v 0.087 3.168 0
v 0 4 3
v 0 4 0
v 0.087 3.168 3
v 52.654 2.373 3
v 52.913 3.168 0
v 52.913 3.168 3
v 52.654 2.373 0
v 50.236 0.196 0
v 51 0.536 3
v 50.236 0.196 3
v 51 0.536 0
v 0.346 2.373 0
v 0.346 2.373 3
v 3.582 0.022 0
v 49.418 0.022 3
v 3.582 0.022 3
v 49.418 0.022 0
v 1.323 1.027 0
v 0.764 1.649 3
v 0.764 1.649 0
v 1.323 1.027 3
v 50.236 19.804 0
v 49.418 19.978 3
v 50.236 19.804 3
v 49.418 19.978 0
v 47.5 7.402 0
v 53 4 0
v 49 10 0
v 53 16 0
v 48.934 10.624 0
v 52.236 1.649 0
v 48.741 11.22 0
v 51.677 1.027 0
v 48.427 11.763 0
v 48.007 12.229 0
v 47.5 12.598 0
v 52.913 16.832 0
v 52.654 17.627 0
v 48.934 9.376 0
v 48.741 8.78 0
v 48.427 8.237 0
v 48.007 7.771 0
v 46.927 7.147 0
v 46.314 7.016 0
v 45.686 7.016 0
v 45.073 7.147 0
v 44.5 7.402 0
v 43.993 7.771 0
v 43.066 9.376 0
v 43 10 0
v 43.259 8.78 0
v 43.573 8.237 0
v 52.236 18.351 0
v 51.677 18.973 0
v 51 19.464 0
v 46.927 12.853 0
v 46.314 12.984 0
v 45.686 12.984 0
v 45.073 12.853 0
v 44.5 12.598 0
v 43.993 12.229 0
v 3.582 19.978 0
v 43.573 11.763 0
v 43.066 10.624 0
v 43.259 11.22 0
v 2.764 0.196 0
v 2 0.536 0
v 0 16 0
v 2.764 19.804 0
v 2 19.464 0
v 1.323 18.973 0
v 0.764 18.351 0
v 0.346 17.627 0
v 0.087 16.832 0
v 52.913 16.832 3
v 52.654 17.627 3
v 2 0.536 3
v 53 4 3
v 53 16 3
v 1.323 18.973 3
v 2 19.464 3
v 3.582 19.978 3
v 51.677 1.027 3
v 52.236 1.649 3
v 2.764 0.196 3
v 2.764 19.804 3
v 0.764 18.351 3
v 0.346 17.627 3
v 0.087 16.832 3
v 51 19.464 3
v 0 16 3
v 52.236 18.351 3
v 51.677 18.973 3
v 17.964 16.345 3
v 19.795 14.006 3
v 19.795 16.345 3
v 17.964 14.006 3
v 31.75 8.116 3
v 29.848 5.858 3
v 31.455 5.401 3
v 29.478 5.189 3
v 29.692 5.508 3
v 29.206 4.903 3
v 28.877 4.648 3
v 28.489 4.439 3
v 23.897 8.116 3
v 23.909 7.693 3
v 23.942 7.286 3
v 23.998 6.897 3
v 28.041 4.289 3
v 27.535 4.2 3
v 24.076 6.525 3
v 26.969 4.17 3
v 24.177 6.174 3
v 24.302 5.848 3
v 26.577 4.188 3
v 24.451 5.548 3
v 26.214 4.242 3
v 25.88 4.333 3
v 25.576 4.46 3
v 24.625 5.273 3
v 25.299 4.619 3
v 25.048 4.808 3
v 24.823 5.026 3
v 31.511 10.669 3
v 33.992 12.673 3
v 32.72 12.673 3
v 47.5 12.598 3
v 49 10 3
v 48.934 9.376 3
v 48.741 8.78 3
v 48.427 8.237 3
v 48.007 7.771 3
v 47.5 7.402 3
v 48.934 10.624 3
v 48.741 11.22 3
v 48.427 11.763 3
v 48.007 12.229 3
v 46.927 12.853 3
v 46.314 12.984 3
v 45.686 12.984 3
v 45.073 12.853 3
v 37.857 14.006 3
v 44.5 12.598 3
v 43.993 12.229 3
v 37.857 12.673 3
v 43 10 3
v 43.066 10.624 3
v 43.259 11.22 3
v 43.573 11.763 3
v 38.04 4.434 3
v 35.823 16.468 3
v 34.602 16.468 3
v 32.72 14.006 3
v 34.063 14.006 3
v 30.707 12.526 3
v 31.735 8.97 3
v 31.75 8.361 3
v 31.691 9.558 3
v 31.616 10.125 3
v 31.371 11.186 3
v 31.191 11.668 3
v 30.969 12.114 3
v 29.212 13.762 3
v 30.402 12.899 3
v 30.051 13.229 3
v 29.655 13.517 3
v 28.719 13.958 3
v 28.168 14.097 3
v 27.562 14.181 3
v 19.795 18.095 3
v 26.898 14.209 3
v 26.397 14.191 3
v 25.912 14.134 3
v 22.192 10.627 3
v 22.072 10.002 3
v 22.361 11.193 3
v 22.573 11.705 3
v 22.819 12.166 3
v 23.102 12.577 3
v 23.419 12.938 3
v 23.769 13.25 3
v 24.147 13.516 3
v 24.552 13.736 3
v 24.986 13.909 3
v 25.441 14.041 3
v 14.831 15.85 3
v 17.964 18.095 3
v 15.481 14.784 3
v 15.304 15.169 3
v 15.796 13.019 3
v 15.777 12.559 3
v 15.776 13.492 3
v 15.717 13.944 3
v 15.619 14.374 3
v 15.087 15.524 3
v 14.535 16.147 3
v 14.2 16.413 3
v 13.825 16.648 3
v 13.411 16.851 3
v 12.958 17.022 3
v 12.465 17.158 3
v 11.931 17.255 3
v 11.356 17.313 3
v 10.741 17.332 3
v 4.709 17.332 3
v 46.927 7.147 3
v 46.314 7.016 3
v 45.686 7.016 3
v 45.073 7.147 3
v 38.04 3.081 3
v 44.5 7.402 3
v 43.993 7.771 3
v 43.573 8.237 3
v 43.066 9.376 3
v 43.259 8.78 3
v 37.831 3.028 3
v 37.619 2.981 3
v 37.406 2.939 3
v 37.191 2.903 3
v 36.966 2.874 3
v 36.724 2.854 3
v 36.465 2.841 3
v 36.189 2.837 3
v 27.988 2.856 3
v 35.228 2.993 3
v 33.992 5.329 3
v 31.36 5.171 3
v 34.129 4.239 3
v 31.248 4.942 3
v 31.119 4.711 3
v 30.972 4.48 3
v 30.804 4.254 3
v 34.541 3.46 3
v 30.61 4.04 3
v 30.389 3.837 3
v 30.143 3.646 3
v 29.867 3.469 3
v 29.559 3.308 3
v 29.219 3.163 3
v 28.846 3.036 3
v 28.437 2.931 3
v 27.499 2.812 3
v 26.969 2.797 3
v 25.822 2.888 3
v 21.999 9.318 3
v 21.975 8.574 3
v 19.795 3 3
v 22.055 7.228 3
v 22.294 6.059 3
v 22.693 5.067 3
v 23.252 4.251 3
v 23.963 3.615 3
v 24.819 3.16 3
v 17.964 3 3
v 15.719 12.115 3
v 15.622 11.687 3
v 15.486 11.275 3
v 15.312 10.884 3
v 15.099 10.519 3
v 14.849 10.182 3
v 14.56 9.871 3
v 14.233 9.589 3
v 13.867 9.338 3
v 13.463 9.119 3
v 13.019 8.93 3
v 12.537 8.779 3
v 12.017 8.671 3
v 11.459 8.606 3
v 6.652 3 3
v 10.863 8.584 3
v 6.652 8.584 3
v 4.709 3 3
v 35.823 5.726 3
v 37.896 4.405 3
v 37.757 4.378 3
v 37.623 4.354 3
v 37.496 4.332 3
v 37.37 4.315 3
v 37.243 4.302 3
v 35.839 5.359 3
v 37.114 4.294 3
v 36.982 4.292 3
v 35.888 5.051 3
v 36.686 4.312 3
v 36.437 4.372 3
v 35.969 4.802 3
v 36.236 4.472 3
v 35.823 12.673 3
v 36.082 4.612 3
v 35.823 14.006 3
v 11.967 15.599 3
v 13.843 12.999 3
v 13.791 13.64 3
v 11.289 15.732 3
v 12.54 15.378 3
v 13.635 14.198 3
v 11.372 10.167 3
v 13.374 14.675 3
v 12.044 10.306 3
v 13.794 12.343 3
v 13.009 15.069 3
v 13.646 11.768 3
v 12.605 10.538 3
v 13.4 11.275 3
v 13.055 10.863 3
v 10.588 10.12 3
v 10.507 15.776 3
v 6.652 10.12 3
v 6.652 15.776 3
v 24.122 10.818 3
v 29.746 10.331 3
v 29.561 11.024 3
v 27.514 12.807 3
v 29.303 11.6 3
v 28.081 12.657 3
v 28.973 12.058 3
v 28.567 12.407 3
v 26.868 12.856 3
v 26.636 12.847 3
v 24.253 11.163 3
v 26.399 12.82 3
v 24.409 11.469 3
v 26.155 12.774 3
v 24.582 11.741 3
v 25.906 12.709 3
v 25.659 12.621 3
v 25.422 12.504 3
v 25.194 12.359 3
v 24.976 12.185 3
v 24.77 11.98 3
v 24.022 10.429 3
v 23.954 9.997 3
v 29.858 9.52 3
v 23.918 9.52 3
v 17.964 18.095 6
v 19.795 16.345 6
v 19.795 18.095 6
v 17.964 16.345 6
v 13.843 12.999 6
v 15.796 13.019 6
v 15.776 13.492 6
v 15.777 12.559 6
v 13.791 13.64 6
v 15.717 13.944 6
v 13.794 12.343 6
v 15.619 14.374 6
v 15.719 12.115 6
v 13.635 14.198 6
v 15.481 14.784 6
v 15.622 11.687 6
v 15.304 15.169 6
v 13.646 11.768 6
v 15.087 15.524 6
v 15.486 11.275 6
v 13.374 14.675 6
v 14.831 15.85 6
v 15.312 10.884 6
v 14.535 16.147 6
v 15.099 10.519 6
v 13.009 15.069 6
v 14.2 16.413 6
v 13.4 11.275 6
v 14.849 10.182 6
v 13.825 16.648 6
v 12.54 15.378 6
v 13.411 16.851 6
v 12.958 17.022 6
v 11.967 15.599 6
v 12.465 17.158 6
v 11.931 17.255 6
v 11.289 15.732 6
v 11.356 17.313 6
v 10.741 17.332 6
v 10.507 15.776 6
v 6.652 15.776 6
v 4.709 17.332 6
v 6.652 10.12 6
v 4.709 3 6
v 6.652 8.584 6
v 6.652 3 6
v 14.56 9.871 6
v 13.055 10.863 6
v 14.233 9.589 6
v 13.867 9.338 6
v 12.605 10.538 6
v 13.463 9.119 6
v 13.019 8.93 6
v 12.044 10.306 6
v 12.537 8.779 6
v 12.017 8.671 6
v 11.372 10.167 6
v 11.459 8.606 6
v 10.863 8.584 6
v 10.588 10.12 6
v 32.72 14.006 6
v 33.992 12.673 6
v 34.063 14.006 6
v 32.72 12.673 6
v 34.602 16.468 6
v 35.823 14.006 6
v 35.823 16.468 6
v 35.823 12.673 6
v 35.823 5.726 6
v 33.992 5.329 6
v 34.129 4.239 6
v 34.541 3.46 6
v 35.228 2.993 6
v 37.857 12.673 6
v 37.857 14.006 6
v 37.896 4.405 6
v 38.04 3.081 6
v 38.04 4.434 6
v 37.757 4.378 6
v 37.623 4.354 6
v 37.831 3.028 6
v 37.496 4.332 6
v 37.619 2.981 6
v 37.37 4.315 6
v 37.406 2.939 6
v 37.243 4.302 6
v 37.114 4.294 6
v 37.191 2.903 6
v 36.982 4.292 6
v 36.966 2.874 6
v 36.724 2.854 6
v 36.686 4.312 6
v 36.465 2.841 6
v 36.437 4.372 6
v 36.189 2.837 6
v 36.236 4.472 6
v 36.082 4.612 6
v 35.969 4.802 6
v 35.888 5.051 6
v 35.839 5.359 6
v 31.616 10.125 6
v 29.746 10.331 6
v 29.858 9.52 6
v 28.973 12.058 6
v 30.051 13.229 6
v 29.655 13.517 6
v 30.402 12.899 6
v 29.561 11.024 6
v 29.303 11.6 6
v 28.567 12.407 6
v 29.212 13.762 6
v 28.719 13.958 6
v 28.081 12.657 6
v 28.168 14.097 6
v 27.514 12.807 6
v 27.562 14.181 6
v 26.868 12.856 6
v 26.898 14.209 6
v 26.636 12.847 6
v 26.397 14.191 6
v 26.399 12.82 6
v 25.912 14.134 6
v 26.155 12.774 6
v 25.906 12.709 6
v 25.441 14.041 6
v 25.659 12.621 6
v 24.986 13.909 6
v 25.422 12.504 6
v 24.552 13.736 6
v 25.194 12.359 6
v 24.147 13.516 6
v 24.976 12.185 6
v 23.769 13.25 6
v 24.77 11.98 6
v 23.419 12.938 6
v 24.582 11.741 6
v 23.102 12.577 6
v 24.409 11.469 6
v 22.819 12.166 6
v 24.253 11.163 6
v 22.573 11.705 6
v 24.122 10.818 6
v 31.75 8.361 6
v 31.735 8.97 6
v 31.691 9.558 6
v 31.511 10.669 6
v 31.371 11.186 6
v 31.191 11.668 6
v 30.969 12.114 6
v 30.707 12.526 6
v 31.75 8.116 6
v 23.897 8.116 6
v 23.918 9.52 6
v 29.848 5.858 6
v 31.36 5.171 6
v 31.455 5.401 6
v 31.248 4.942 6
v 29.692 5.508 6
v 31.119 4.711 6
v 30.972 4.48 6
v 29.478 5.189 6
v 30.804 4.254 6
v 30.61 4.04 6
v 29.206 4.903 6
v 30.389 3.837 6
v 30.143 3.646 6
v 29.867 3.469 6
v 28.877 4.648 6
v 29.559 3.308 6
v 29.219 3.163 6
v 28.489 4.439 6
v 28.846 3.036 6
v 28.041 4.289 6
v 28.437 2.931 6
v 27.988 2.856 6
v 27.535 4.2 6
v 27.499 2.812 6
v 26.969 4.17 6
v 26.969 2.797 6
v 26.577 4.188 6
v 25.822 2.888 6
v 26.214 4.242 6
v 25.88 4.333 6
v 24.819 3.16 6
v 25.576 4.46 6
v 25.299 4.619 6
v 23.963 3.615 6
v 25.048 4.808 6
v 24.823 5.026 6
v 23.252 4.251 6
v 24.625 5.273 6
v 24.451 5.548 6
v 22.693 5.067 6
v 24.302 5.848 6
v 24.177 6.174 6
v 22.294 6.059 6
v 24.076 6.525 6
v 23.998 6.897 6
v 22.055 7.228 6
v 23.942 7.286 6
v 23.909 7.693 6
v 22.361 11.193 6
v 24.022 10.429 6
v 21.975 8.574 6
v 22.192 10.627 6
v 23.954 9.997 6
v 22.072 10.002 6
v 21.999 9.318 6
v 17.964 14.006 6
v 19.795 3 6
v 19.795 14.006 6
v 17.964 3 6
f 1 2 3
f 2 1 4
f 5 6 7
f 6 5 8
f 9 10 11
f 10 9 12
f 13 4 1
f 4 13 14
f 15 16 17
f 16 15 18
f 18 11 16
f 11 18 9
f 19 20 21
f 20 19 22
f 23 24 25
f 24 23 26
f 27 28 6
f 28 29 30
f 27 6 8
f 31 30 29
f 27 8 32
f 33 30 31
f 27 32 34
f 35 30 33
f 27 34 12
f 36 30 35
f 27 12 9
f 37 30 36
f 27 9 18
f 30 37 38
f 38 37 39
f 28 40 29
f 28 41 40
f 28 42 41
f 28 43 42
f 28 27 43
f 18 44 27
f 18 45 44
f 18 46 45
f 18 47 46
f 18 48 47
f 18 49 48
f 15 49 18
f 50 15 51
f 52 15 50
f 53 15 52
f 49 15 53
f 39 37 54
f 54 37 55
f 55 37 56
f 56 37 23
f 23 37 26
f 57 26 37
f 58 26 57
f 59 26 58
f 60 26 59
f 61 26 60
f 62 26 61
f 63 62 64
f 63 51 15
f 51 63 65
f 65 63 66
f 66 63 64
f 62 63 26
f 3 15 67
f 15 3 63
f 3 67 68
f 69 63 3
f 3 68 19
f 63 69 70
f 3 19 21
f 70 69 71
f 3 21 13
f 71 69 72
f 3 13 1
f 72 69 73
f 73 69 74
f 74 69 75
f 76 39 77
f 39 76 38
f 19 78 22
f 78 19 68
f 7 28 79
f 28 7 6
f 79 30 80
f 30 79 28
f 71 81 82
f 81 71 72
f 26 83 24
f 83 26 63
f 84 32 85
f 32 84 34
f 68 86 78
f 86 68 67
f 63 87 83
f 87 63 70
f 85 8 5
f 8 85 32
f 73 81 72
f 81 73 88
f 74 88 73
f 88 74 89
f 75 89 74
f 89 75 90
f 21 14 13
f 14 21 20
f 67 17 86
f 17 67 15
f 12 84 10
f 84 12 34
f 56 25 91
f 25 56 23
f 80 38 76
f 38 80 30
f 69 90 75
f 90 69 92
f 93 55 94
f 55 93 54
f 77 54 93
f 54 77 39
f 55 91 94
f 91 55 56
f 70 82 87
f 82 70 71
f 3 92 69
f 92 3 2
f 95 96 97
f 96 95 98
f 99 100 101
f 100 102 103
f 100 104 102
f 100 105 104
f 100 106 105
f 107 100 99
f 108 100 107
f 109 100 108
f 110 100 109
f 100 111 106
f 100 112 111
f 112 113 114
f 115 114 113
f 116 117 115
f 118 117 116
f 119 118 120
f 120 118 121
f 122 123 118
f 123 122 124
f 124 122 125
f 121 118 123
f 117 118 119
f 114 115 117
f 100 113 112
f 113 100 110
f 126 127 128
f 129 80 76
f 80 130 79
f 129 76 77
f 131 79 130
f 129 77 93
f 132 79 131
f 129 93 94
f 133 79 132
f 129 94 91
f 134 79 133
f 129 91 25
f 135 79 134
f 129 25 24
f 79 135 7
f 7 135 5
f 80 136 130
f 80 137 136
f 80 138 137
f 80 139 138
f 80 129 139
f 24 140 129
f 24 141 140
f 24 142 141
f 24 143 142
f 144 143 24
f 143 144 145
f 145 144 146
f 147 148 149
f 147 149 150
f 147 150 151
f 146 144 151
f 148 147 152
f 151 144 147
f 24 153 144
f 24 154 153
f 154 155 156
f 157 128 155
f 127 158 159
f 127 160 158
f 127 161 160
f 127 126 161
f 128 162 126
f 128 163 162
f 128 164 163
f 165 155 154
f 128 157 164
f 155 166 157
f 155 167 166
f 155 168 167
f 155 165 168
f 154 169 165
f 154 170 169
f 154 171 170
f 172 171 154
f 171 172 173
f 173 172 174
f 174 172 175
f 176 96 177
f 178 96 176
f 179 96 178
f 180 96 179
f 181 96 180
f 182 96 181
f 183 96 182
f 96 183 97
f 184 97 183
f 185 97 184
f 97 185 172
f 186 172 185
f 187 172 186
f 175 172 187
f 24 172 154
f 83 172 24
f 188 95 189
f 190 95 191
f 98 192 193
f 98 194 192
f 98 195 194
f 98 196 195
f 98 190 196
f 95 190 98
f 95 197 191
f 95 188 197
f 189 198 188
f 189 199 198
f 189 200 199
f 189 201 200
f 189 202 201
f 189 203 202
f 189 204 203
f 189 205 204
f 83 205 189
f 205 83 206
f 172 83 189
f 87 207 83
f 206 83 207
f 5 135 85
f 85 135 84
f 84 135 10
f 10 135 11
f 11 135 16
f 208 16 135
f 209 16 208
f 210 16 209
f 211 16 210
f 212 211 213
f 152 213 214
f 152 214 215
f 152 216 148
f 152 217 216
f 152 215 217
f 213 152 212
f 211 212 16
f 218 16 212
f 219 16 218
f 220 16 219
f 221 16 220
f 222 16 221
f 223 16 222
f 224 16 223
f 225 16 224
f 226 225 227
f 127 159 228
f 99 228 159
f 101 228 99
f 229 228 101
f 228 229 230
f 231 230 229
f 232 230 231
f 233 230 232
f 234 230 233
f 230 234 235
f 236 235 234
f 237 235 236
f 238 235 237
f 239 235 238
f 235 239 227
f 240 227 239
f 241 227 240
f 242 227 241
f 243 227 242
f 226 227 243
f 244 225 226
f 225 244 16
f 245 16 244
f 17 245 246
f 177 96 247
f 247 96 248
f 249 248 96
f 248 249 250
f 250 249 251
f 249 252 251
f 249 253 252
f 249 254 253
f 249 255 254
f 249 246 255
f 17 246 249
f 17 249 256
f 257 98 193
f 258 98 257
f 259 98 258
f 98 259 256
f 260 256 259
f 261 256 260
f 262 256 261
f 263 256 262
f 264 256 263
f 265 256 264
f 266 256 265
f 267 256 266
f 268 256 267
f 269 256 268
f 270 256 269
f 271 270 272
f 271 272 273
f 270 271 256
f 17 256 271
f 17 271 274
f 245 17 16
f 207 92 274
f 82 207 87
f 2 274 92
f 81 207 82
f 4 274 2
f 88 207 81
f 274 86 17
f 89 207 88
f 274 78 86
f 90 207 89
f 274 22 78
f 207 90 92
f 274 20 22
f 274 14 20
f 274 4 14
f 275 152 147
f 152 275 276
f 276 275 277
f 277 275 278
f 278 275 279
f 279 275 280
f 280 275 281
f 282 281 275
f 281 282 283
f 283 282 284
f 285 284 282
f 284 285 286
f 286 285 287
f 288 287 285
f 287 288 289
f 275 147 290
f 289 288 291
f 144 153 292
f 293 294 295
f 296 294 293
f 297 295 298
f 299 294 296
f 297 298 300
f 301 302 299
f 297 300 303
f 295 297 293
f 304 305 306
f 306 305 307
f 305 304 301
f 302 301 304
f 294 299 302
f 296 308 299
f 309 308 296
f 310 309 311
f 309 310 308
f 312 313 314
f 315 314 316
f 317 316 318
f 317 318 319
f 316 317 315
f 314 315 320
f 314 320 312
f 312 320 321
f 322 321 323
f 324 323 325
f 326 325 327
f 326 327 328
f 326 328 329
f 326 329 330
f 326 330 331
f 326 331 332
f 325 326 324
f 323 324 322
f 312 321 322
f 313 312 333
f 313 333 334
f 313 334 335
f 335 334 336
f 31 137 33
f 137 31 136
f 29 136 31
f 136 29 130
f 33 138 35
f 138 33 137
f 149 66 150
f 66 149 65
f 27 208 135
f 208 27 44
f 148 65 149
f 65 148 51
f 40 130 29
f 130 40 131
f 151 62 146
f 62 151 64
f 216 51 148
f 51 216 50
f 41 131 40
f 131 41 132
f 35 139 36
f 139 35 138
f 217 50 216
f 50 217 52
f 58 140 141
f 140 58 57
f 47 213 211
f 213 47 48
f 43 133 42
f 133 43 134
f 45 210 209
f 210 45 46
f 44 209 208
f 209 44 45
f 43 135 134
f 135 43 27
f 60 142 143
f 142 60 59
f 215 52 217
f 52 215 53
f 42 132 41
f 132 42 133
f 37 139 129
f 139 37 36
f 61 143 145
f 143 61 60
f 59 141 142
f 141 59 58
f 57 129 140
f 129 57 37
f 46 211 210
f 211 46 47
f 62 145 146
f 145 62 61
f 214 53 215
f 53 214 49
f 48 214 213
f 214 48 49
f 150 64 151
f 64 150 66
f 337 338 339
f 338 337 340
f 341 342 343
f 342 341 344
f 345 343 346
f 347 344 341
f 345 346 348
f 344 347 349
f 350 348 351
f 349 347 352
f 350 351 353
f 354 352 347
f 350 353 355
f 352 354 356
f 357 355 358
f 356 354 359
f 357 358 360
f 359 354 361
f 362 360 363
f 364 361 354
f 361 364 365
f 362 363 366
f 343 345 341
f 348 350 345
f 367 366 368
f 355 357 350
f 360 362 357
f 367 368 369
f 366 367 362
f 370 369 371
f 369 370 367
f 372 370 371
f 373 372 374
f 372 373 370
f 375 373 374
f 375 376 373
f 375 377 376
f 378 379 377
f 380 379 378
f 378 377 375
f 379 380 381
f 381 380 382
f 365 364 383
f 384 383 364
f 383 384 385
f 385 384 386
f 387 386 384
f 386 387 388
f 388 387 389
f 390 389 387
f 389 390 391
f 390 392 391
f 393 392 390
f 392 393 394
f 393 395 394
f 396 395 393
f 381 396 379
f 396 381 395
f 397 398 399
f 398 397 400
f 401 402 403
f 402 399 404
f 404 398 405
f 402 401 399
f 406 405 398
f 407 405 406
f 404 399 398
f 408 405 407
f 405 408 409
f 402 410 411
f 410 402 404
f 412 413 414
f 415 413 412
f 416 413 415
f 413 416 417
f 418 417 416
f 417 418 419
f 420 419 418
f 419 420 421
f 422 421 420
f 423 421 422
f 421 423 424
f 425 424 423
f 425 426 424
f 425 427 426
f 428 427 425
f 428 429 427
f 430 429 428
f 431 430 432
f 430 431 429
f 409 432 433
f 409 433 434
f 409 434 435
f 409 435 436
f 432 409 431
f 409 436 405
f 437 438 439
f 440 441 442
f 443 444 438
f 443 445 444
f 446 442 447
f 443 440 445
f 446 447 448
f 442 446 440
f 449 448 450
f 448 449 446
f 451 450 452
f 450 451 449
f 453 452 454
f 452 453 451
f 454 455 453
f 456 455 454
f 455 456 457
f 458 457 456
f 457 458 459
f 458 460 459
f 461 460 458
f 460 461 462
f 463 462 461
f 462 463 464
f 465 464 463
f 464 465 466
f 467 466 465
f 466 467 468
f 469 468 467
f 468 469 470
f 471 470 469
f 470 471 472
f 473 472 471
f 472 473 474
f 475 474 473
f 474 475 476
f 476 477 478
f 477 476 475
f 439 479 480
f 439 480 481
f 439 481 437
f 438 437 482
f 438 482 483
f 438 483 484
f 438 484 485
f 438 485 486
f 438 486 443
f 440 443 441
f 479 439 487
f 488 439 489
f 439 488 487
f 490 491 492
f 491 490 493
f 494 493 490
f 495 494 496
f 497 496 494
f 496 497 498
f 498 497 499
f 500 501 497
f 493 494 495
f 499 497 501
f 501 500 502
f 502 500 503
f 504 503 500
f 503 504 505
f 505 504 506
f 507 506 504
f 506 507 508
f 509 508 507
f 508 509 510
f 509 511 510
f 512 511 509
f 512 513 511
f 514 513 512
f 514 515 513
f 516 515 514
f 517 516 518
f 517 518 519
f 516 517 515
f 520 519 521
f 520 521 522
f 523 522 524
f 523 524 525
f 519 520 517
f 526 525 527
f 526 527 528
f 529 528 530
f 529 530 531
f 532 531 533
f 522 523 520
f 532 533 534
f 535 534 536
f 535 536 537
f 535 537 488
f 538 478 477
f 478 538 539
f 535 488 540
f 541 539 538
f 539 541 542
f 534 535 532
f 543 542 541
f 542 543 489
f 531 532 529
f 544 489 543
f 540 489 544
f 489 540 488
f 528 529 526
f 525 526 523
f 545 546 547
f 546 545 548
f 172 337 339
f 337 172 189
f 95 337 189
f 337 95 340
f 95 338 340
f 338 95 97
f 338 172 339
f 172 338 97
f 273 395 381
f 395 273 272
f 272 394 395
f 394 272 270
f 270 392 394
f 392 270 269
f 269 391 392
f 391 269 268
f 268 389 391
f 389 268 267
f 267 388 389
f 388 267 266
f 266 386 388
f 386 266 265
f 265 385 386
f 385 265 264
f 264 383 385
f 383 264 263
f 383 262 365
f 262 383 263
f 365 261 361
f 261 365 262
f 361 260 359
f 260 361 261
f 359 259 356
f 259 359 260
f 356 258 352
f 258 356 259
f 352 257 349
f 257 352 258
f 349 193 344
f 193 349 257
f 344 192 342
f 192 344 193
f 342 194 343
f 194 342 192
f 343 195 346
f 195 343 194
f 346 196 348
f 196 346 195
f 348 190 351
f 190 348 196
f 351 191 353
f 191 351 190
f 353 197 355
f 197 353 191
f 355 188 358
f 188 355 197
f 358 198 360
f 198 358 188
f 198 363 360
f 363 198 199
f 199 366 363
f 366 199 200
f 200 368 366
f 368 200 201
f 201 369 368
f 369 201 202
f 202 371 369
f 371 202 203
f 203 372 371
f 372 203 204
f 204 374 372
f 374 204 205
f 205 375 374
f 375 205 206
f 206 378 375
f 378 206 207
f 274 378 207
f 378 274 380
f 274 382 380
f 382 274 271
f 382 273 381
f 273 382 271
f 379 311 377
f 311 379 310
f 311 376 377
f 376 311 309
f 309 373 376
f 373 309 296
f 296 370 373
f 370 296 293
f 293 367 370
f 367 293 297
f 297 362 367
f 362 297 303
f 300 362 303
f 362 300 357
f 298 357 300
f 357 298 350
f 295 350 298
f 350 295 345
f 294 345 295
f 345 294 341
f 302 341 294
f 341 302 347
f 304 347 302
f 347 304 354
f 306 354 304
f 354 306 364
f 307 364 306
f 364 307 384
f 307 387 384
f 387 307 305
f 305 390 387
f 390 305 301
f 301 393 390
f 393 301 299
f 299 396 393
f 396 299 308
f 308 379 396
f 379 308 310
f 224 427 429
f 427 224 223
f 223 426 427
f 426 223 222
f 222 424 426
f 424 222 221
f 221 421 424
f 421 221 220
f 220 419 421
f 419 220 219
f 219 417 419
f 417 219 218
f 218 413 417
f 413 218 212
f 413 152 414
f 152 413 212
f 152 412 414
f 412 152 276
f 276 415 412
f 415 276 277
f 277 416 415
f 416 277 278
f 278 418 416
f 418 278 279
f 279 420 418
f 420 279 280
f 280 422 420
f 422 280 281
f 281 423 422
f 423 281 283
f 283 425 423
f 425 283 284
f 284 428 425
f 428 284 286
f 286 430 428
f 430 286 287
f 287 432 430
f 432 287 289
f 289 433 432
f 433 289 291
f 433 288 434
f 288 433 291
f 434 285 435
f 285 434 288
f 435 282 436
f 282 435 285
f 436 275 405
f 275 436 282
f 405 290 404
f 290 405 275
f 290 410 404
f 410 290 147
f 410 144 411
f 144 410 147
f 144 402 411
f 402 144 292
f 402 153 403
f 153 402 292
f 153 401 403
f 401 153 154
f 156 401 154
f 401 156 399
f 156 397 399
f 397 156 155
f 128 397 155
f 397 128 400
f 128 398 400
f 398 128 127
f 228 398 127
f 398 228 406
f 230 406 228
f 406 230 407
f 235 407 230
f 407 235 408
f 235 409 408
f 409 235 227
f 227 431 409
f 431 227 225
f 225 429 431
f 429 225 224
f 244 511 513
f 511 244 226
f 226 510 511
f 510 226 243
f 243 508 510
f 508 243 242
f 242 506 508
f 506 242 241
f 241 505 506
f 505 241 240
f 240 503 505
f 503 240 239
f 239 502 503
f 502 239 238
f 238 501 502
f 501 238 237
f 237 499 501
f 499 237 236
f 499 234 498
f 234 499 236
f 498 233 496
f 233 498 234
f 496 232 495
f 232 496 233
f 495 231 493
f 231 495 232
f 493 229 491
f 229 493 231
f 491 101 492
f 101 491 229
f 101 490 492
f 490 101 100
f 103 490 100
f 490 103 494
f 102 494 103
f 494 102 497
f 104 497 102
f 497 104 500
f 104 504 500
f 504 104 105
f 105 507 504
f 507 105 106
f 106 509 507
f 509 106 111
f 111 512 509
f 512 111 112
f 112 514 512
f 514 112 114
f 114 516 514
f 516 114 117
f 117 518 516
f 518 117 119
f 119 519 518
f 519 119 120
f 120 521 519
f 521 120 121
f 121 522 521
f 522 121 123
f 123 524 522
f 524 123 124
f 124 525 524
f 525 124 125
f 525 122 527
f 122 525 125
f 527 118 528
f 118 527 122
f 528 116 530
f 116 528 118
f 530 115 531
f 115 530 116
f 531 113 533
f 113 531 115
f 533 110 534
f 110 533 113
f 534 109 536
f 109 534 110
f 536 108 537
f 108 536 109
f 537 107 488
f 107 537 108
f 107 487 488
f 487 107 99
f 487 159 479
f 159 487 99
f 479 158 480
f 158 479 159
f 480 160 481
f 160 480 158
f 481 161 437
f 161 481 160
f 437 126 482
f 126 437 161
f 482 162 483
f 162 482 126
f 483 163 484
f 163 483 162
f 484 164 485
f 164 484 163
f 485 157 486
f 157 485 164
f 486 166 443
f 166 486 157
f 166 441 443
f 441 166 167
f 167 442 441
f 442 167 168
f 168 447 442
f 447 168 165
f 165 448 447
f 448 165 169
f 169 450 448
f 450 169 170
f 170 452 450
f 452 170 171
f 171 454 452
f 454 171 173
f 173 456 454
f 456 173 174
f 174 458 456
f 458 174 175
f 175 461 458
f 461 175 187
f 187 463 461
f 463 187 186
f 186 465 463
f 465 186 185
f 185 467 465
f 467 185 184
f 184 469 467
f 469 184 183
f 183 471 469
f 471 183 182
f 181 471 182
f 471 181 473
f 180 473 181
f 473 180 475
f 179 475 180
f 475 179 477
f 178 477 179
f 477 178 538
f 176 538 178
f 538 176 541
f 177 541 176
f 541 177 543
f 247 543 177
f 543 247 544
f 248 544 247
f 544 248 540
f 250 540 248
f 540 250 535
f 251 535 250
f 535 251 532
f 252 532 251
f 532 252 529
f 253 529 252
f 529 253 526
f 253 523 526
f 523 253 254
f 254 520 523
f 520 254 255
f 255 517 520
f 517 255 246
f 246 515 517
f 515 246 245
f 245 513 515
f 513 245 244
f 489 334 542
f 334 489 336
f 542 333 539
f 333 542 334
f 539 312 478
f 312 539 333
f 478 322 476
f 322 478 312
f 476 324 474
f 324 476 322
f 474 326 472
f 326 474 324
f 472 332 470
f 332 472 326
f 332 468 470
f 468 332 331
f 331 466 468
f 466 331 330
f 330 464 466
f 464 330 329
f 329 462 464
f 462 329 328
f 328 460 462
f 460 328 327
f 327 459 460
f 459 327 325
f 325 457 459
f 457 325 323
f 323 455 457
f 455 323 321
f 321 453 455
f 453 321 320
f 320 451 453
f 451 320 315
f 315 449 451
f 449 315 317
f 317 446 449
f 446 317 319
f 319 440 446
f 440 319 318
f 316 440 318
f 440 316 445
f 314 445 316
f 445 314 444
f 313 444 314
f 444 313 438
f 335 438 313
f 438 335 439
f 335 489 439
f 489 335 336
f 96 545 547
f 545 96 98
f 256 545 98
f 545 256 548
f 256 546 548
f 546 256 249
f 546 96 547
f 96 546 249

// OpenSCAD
// file: lib.scad
module bettersphere(r) {
   sphere(r, $fs=0.5);
}

module bettercylinder(h, r) {
   cylinder(h=h, r=r, $fs=0.5);
}

module roundedcube(dims, rounding, only_sides=false) {
    if (only_sides) {
        translate([rounding, rounding, 0]) {
            minkowski() {
                bettercylinder(1, rounding);
                cube(dims - [2*rounding, 2*rounding, 1]);
            }
        }
    } else {
        translate([rounding, rounding, rounding]) {
            minkowski() {
                cube(dims - [2*rounding, 2*rounding, 2*rounding]);
                bettersphere(rounding);
            }
        }
    }
}

//roundedcube([20, 50, 30], 3, only_sides=false);

module roundedcylinder(h, r, rounding) {
    translate([0, 0, rounding]) {
        minkowski()  {
            cylinder(h = h - 2*rounding, r = r - rounding);
            bettersphere(rounding);
        }
    }
}

//roundedcylinder(50, 20, 5);
// main file
use <lib.scad>;

difference() {
    roundedcube([53, 20, 3], 4, only_sides=true);  
    translate([46,10, -1]) bettercylinder(5, r=3);
}
translate([3, 3, 3]) linear_extrude(3) text("Piet", 15);
